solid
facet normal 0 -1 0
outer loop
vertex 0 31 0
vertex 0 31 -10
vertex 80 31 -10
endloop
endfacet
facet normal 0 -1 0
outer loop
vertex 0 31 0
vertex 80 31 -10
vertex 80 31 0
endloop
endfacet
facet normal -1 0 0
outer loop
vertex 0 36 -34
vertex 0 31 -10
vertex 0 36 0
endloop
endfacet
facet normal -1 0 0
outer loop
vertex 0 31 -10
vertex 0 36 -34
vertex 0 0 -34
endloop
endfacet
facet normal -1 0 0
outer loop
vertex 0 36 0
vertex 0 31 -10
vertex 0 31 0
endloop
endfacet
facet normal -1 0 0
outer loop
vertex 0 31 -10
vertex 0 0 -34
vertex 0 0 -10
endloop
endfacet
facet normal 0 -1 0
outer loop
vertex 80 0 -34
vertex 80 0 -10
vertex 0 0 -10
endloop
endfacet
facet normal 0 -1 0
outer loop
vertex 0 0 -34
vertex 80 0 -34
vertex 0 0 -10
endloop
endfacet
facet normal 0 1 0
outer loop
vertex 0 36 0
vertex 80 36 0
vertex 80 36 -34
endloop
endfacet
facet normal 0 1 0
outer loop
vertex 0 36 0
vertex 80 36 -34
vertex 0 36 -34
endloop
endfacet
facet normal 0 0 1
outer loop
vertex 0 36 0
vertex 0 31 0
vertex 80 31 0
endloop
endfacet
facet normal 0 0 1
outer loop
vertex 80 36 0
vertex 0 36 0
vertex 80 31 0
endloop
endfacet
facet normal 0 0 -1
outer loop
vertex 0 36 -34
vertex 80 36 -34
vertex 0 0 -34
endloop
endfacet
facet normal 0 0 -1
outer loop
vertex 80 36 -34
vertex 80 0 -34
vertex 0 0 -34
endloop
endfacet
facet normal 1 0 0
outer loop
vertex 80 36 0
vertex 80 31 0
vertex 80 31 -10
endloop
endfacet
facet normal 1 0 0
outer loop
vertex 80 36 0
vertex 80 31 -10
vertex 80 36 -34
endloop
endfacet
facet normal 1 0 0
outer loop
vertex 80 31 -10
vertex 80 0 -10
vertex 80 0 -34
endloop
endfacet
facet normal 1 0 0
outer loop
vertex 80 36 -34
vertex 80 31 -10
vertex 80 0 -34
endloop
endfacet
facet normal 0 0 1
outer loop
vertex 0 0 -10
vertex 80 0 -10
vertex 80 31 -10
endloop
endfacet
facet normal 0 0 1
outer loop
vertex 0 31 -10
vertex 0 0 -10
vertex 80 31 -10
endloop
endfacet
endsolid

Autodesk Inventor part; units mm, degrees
ref_plane "YZ Plane" through (0, 0, 0) normal (1, 0, 0) x (0, 1, 0)
ref_plane "XZ Plane" through (0, 0, 0) normal (0, 1, 0) x (-1, 0, 0)
ref_plane "XY Plane" through (0, 0, 0) normal (0, 0, 1) x (1, 0, 0)
sketch "Sketch1" plane through (0, 0, 0) normal (0, 1, 0) x (-1, 0, 0)
  line L0 (0, 0) -> (-80, 0)
  line L1 (-80, 0) -> (-80, -34)
  line L2 (-80, -34) -> (0, -34)
  line L3 (0, -34) -> (0, 0)
  dimension "d0" = 80
  dimension "d1" = 34
extrude "Extrusion1" add sketch "Sketch1" along normal blind 36
sketch "Sketch2" plane through (80, 0, 0) normal (1, 0, 0) x (0, 0, -1)
  line L0 (0, 0) -> (34, 0) projected
  line L1 (34, 0) -> (34, 36) projected
  line L2 (0, 36) -> (34, 36) projected
  line L3 (0, 0) -> (0, 36) projected
  line L4 (0, 0) -> (10, 0)
  line L5 (10, 0) -> (10, 31)
  line L6 (10, 31) -> (0, 31)
  line L7 (0, 31) -> (0, 0)
  dimension "d4" = 5
  dimension "d5" = 24
extrude "Extrusion2" cut sketch "Sketch2" against normal through all contours L3 L6 L5 L0
properties part number "cushion"
